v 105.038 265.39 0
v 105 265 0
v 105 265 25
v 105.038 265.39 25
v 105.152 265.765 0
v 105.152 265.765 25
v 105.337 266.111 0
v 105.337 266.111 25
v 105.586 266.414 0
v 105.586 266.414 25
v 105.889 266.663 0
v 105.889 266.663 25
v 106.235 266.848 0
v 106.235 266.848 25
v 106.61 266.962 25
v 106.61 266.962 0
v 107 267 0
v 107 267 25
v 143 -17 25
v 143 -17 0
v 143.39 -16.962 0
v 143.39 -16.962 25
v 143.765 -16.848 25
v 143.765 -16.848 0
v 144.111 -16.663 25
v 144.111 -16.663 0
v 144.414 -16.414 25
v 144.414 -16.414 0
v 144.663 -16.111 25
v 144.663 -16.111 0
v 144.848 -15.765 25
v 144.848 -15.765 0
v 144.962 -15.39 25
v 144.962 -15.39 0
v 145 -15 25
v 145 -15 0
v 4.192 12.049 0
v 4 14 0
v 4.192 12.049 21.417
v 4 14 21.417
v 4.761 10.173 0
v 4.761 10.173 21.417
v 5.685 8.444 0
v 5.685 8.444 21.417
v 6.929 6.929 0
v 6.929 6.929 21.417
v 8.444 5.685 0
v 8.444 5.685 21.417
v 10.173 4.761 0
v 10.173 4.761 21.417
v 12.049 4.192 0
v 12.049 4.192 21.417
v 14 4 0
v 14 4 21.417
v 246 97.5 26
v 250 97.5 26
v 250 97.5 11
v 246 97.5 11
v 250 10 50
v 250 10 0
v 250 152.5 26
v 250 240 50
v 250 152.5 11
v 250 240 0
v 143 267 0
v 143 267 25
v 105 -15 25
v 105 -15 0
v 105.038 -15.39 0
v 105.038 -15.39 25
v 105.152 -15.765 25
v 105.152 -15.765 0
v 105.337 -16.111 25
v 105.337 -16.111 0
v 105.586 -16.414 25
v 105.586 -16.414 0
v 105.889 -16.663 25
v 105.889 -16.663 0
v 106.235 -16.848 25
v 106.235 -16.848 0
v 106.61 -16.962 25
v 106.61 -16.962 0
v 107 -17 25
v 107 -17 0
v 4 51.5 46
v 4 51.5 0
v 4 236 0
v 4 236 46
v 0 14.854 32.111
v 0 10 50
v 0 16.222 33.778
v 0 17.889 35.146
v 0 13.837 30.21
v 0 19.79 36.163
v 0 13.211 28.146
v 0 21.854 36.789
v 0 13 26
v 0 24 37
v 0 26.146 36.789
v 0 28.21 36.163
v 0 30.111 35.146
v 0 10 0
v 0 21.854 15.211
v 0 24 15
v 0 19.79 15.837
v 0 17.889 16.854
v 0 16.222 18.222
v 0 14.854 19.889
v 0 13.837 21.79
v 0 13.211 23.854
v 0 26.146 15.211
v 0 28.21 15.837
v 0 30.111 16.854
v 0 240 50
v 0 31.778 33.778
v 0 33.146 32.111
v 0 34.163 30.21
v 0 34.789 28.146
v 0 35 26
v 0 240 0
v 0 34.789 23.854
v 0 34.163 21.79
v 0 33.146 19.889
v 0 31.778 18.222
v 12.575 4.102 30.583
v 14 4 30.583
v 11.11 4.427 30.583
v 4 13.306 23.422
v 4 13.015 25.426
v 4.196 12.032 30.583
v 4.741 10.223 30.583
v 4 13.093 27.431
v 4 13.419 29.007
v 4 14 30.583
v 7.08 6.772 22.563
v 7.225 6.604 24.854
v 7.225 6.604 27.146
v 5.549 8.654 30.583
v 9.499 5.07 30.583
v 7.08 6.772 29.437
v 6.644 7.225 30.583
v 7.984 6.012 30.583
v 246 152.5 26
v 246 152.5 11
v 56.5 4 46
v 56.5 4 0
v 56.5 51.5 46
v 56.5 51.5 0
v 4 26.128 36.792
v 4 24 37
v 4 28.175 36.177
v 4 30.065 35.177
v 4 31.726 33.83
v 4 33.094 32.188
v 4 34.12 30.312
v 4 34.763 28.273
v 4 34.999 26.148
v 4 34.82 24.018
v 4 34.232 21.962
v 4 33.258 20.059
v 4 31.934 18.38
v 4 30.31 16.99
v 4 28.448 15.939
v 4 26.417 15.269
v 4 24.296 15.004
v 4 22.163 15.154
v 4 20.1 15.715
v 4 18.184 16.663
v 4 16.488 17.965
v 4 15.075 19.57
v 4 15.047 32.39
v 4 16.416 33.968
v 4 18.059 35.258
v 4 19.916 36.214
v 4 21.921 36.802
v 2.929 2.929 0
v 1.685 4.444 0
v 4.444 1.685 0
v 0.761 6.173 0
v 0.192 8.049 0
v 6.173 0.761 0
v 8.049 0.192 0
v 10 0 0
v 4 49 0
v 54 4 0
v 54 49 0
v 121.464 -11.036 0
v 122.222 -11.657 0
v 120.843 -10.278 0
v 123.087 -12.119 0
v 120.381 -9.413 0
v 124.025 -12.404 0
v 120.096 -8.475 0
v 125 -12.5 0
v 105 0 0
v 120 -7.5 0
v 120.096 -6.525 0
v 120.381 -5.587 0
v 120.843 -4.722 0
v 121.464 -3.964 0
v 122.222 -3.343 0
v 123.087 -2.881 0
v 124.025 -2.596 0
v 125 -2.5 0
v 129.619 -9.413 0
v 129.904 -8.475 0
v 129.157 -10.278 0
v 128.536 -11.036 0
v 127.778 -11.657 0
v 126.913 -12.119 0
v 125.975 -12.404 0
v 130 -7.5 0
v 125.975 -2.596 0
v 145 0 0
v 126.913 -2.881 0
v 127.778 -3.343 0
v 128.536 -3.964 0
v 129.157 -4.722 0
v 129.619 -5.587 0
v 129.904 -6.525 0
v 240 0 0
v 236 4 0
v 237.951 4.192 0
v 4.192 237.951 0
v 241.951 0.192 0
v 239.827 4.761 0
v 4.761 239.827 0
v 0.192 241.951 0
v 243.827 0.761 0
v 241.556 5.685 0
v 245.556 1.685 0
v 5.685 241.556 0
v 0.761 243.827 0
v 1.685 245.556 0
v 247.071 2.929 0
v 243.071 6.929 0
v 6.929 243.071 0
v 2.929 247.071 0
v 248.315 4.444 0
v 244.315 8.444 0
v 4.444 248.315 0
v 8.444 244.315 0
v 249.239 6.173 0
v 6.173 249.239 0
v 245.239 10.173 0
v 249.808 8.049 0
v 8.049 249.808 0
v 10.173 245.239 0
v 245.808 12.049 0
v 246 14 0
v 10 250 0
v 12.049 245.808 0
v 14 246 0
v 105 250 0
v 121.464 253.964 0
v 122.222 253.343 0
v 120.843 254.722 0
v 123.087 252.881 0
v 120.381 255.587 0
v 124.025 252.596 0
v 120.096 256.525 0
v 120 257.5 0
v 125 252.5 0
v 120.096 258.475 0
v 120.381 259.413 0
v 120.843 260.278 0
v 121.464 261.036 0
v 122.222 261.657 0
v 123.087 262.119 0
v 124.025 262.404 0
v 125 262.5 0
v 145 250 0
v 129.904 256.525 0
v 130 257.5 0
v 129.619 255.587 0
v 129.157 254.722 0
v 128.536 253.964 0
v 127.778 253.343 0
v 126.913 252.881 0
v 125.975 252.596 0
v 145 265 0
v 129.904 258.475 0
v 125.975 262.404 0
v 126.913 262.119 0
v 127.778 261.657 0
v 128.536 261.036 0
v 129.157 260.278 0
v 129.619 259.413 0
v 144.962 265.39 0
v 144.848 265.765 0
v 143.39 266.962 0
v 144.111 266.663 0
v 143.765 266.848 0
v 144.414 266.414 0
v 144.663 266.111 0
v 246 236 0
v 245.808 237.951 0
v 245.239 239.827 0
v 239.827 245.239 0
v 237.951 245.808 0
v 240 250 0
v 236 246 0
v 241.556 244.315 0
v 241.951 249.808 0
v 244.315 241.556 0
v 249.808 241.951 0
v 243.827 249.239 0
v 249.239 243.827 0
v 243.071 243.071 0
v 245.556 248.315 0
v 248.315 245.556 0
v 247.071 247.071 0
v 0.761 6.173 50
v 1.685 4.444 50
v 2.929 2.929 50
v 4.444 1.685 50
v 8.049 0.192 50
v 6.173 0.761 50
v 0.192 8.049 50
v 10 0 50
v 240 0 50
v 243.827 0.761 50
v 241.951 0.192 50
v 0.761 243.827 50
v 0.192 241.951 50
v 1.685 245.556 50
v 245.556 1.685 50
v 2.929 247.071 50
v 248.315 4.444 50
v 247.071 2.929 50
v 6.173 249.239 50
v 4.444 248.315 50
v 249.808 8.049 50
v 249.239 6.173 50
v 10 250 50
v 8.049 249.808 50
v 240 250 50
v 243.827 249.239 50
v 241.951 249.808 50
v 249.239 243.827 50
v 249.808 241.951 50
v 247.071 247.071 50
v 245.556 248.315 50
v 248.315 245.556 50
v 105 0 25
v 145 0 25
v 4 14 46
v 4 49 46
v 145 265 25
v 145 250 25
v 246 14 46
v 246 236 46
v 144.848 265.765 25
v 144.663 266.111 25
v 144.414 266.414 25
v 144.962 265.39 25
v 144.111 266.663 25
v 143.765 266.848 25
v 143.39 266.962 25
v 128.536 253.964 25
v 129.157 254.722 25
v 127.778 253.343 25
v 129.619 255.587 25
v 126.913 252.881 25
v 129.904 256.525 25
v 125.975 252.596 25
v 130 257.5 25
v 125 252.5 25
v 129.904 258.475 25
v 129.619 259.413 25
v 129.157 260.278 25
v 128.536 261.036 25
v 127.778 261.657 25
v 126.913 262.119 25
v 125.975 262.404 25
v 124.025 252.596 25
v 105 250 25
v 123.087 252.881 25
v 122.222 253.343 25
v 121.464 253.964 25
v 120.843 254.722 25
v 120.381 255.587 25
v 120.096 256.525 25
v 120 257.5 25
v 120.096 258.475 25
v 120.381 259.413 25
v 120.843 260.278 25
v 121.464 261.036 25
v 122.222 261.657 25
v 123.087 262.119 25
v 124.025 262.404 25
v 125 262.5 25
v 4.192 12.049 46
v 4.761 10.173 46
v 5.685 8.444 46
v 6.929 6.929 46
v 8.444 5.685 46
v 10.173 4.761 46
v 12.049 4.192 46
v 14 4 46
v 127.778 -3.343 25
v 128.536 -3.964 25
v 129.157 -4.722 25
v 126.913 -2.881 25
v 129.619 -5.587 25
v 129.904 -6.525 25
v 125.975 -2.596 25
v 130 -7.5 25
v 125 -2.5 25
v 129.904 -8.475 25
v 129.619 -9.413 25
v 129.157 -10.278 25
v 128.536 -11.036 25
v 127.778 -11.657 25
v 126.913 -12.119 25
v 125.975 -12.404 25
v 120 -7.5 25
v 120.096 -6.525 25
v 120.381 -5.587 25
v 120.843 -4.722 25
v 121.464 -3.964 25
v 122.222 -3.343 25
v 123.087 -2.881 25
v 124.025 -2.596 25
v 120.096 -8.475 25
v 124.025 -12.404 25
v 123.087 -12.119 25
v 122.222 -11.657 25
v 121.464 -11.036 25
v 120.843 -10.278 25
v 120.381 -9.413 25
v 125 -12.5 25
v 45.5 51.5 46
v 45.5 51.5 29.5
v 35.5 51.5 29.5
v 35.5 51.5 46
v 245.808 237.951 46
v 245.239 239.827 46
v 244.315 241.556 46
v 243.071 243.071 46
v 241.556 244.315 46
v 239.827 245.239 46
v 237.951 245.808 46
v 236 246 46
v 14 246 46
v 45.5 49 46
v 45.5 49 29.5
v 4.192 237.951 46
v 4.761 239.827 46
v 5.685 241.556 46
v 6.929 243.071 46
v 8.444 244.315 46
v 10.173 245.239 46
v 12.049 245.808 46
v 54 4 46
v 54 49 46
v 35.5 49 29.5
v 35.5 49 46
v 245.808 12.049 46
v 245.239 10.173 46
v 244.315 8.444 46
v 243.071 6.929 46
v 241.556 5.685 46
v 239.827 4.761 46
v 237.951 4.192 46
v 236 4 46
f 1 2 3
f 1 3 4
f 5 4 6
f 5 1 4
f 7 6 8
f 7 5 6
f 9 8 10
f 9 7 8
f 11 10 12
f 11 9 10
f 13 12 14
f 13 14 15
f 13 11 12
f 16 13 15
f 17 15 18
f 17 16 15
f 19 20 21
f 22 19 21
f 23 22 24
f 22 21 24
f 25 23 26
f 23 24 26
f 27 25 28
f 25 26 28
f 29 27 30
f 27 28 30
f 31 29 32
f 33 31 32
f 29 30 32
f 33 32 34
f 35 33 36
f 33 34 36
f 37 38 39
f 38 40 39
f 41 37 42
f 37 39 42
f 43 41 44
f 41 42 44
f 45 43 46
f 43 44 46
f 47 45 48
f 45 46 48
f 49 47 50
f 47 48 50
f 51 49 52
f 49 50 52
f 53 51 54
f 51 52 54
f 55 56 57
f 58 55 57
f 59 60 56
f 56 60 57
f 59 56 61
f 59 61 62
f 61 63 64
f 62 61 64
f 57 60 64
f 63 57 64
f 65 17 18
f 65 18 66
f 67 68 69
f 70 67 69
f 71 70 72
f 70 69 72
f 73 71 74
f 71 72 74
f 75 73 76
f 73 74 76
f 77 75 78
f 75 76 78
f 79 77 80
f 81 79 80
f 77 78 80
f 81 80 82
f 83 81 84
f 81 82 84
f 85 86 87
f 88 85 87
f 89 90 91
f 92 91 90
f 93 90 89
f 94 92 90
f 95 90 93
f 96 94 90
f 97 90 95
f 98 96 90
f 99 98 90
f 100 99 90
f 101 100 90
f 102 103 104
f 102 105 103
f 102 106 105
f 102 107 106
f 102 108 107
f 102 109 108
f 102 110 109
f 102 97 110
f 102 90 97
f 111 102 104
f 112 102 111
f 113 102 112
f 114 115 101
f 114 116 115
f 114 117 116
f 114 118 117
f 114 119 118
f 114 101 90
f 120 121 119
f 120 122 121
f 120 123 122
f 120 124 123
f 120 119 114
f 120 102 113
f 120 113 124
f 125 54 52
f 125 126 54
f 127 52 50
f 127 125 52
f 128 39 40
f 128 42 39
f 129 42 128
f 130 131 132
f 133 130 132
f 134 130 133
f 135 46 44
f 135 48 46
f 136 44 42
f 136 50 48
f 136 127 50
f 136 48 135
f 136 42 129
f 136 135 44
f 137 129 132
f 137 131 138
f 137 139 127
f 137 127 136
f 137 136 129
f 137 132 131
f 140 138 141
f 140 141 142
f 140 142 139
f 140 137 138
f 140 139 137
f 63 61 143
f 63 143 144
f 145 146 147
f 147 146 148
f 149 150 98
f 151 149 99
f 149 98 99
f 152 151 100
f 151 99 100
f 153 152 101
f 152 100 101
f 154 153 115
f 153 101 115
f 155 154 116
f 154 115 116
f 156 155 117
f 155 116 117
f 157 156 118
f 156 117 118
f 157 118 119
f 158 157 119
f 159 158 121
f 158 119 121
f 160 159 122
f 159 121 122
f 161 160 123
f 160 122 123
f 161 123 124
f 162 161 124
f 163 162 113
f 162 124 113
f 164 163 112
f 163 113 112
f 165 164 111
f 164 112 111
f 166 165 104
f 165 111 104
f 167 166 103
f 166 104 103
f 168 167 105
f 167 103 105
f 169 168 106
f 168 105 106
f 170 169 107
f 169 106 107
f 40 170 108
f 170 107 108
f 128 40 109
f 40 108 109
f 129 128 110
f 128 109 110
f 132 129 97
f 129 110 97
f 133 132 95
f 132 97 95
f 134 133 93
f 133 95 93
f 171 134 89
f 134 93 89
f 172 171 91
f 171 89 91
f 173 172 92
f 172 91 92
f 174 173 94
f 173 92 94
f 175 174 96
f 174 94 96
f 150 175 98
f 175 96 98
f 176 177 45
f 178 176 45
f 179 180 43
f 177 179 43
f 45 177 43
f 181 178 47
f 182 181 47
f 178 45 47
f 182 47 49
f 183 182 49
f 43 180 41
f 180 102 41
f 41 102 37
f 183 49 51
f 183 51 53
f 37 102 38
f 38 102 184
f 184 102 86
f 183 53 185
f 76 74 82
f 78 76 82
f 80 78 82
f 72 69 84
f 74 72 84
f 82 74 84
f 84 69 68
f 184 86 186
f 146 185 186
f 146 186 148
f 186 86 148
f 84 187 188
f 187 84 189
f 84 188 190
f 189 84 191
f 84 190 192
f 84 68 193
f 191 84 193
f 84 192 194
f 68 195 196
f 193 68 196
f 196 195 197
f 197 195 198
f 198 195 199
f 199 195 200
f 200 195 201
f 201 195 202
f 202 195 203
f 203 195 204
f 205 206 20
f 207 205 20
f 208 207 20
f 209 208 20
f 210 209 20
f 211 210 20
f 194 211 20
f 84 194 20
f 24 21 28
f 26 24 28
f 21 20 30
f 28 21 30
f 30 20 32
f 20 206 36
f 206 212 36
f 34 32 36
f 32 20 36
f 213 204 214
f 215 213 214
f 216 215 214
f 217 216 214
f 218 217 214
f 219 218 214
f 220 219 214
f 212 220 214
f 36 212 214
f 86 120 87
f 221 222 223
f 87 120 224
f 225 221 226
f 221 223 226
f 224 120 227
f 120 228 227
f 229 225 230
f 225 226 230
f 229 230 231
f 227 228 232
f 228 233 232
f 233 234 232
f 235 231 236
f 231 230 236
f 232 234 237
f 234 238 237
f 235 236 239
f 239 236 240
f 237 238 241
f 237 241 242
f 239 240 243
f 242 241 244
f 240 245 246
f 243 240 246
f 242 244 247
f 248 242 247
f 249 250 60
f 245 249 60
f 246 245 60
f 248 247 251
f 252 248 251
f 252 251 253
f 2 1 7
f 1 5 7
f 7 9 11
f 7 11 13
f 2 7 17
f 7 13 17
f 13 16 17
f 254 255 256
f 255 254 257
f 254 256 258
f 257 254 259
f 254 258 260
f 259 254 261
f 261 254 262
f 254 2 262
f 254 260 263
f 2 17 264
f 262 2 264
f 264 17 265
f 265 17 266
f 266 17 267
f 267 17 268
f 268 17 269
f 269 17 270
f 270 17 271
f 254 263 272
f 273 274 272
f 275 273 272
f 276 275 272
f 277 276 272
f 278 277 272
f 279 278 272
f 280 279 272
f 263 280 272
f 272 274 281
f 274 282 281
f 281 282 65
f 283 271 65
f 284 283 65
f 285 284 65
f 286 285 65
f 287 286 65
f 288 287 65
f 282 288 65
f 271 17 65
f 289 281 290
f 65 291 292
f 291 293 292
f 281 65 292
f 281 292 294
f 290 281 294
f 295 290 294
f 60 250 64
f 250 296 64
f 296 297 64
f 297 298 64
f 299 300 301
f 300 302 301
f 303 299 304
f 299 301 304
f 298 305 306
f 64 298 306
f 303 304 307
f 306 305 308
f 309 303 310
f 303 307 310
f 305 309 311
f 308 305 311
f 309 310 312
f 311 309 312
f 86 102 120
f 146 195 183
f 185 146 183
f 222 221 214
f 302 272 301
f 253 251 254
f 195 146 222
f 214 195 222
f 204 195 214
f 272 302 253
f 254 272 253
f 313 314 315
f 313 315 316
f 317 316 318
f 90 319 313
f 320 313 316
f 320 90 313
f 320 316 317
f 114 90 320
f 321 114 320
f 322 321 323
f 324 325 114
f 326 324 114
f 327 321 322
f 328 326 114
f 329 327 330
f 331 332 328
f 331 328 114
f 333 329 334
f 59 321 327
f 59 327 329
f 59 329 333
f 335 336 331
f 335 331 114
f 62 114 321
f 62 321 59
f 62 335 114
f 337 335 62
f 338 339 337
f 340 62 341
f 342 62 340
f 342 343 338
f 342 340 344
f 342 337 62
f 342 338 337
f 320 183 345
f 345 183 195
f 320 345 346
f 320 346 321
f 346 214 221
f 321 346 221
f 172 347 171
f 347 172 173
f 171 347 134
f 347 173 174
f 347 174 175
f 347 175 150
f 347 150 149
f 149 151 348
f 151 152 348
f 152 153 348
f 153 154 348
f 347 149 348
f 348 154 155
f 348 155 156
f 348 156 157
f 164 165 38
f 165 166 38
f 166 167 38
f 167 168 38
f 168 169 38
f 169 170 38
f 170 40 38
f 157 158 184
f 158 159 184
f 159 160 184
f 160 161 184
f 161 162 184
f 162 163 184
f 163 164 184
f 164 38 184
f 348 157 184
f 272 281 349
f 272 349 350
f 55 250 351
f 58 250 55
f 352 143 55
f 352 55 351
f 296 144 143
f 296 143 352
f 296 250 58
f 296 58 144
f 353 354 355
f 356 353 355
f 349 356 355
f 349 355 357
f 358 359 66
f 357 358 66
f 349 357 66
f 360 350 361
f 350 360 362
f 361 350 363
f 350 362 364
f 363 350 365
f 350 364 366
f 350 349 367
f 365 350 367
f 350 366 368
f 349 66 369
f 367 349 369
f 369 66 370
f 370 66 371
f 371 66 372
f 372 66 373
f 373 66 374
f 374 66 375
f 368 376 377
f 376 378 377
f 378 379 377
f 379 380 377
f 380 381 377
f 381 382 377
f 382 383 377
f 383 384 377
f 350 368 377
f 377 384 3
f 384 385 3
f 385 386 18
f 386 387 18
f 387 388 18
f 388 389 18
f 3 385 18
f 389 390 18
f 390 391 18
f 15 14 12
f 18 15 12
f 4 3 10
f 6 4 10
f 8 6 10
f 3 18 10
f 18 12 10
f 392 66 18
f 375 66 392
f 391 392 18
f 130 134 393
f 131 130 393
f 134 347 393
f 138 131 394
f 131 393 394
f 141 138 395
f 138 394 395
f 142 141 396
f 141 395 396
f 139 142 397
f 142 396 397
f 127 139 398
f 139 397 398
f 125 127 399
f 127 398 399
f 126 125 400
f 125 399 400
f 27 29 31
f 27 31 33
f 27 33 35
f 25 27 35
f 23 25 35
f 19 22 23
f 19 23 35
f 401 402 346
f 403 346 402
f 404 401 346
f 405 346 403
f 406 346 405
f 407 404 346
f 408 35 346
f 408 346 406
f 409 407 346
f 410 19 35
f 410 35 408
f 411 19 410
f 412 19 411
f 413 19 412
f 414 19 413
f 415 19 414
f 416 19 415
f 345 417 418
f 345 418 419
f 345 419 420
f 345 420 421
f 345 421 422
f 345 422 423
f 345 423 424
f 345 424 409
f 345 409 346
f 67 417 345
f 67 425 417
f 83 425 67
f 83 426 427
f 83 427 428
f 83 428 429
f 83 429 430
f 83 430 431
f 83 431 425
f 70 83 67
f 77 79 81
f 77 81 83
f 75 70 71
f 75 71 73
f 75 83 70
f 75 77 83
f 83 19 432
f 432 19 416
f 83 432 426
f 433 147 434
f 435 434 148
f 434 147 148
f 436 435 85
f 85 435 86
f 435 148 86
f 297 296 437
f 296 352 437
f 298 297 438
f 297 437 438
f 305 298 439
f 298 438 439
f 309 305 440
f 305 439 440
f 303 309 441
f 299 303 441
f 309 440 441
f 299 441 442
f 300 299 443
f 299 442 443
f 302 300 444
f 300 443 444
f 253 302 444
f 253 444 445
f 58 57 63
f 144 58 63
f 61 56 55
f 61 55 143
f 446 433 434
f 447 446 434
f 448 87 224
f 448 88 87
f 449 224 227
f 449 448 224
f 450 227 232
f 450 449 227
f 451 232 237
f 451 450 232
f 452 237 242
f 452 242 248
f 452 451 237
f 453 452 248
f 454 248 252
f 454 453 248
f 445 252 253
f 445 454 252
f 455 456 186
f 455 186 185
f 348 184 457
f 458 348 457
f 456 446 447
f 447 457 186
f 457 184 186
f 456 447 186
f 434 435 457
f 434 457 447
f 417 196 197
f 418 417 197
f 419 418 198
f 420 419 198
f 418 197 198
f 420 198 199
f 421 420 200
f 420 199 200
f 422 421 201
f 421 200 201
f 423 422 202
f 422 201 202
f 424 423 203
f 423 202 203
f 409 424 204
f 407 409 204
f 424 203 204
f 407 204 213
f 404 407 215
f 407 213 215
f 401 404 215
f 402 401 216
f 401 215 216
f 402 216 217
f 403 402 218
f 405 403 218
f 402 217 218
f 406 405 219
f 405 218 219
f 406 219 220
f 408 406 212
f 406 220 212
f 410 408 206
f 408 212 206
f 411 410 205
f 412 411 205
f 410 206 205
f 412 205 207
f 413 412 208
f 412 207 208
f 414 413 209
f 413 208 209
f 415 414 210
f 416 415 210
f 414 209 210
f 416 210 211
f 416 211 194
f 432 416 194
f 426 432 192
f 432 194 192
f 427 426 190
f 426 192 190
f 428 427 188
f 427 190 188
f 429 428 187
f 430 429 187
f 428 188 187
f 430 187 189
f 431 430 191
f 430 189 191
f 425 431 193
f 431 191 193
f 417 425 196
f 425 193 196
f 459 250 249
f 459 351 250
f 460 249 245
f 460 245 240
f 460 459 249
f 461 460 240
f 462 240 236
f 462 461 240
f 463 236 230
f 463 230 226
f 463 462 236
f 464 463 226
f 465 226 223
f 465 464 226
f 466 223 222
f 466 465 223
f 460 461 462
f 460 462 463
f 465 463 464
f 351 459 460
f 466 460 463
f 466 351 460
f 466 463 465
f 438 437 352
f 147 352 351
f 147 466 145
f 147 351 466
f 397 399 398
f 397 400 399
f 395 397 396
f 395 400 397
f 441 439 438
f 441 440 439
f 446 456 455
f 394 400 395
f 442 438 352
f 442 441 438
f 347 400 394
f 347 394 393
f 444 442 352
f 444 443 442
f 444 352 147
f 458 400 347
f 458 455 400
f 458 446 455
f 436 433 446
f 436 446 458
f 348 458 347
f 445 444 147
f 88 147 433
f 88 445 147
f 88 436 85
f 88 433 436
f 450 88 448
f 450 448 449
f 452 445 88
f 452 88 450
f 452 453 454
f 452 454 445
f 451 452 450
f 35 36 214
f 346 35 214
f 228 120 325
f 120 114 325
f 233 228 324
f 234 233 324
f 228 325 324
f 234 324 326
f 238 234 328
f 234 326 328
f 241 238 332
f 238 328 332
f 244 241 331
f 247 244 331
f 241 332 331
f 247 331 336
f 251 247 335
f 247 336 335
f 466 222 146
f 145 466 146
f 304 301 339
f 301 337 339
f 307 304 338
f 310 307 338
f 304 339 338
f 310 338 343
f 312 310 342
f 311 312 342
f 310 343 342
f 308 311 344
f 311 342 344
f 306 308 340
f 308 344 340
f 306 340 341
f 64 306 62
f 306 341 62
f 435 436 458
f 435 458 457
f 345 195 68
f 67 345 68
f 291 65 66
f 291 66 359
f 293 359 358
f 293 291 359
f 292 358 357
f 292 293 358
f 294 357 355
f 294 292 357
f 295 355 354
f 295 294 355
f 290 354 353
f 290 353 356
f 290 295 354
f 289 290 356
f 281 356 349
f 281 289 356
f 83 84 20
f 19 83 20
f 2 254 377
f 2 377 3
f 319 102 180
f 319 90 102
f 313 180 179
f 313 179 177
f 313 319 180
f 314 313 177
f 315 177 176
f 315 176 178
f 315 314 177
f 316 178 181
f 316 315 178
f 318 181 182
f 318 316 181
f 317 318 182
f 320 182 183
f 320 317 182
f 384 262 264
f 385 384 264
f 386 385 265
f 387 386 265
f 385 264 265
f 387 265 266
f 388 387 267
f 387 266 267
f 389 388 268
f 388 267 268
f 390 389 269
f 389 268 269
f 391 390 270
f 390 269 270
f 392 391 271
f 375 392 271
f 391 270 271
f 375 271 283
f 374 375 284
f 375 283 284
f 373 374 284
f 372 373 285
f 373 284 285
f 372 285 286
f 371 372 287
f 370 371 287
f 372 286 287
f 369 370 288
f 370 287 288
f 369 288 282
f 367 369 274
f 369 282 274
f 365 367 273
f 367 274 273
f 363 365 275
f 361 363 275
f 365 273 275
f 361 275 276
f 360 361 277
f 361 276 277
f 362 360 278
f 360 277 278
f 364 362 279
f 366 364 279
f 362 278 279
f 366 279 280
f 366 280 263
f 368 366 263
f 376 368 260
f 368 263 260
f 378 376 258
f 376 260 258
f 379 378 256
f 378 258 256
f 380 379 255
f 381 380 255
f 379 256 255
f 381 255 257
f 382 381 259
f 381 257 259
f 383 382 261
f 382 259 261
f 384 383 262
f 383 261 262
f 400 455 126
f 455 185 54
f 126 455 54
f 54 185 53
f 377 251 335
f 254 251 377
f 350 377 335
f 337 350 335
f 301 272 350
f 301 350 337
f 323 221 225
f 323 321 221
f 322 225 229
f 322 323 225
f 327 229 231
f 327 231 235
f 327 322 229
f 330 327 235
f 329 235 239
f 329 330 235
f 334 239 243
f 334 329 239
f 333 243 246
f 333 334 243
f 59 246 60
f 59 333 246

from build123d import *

# Parameters (mm, degrees)
SKETCH1_W           = 250
SKETCH1_H           = 250
BOSS_EXTRUDE1_DEPTH = 50
BOSS_EXTRUDE2_DEPTH = 25
SKETCH8_R           = 5
CUT_EXTRUDE1_DEPTH  = 25
SKETCH9_W           = 242
SKETCH9_H           = 242
CUT_EXTRUDE4_DEPTH  = 46
EXTRUDE_THIN2_DEPTH = 46
SKETCH15_R          = 11
CUT_EXTRUDE5_DEPTH  = 4
SKETCH17_W          = 15
SKETCH17_H          = 55
CUT_EXTRUDE7_DEPTH  = 4
SKETCH18_W          = 10
SKETCH18_H          = 16.5
CUT_EXTRUDE8_DEPTH  = 2.5
FILLET1_R           = 10
FILLET2_R           = 10


with BuildPart() as part:
    # Sketch1 → Boss-Extrude1 (new body)
    with BuildSketch(Plane.XY):
        with Locations((125, 125)):
            Rectangle(SKETCH1_W, SKETCH1_H)
    extrude(amount=BOSS_EXTRUDE1_DEPTH)

    # Sketch5 → Boss-Extrude2 (add)
    with BuildSketch(Plane.XY):
        with BuildLine():
            Line((105, 250), (105, 265))
            ThreePointArc((105, 265), (105.585786438, 266.414213562), (107, 267))
            Line((107, 267), (143, 267))
            ThreePointArc((143, 267), (144.414213562, 266.414213562), (145, 265))
            Line((145, 265), (145, 250))
            Line((145, 250), (105, 250))
        make_face()
    boss_extrude2 = extrude(amount=BOSS_EXTRUDE2_DEPTH)

    # Mirror1: Boss-Extrude2 across plane
    add(boss_extrude2.mirror(Plane.ZX.offset(125)))

    # Sketch8 → Cut-Extrude1 (cut)
    with BuildSketch(Plane(origin=(0, 0, 0), x_dir=(-1, 0, 0), z_dir=(0, 0, -1))):
        with Locations((-125, -7.5)):
            Circle(SKETCH8_R)
        with Locations((-125, 257.5)):
            Circle(SKETCH8_R)
    extrude(amount=-CUT_EXTRUDE1_DEPTH, mode=Mode.SUBTRACT)

    # Sketch9 → Cut-Extrude4 (cut)
    with BuildSketch(Plane(origin=(0, 0, 0), x_dir=(-1, 0, 0), z_dir=(0, 0, -1))):
        with Locations((-125, 125)):
            Rectangle(SKETCH9_W, SKETCH9_H)
    extrude(amount=-CUT_EXTRUDE4_DEPTH, mode=Mode.SUBTRACT)

    # Sketch14 → Extrude-Thin2 (add)
    with BuildSketch(Plane(origin=(0, 0, 0), x_dir=(-1, 0, 0), z_dir=(0, 0, -1))):
        Polygon((-4, 49), (-54, 49), (-54, 4), (-56.5, 4), (-56.5, 51.5), (-4, 51.5), align=None)
    extrude(amount=-EXTRUDE_THIN2_DEPTH)

    # Sketch15 → Cut-Extrude5 (cut)
    with BuildSketch(Plane.ZY):
        with Locations((26, 24)):
            Circle(SKETCH15_R)
    extrude(amount=-CUT_EXTRUDE5_DEPTH, mode=Mode.SUBTRACT)

    # Sketch17 → Cut-Extrude7 (cut)
    with BuildSketch(Plane(origin=(250, 0, 0), x_dir=(0, 0, -1), z_dir=(1, 0, 0))):
        with Locations((-18.5, 125)):
            Rectangle(SKETCH17_W, SKETCH17_H)
    extrude(amount=-CUT_EXTRUDE7_DEPTH, mode=Mode.SUBTRACT)

    # Sketch18 → Cut-Extrude8 (cut)
    with BuildSketch(Plane(origin=(0, 51.5, 0), x_dir=(1, 0, 0), z_dir=(0, 1, 0))):
        with Locations((40.5, -37.75)):
            Rectangle(SKETCH18_W, SKETCH18_H)
    extrude(amount=-CUT_EXTRUDE8_DEPTH, mode=Mode.SUBTRACT)

    # Fillet1
    fillet1_edges = [part.edges().sort_by_distance(p)[0] for p in [
        (0, 250, 25),
        (250, 250, 25),
        (250, 0, 25),
        (0, 0, 25),
    ]]
    fillet(fillet1_edges, radius=FILLET1_R)

    # Fillet2
    fillet2_edges = [part.edges().sort_by_distance(p)[0] for p in [
        (246, 246, 23),
        (4, 246, 23),
        (4, 4, 23),
        (246, 4, 23),
    ]]
    fillet(fillet2_edges, radius=FILLET2_R)


solid = part.part
